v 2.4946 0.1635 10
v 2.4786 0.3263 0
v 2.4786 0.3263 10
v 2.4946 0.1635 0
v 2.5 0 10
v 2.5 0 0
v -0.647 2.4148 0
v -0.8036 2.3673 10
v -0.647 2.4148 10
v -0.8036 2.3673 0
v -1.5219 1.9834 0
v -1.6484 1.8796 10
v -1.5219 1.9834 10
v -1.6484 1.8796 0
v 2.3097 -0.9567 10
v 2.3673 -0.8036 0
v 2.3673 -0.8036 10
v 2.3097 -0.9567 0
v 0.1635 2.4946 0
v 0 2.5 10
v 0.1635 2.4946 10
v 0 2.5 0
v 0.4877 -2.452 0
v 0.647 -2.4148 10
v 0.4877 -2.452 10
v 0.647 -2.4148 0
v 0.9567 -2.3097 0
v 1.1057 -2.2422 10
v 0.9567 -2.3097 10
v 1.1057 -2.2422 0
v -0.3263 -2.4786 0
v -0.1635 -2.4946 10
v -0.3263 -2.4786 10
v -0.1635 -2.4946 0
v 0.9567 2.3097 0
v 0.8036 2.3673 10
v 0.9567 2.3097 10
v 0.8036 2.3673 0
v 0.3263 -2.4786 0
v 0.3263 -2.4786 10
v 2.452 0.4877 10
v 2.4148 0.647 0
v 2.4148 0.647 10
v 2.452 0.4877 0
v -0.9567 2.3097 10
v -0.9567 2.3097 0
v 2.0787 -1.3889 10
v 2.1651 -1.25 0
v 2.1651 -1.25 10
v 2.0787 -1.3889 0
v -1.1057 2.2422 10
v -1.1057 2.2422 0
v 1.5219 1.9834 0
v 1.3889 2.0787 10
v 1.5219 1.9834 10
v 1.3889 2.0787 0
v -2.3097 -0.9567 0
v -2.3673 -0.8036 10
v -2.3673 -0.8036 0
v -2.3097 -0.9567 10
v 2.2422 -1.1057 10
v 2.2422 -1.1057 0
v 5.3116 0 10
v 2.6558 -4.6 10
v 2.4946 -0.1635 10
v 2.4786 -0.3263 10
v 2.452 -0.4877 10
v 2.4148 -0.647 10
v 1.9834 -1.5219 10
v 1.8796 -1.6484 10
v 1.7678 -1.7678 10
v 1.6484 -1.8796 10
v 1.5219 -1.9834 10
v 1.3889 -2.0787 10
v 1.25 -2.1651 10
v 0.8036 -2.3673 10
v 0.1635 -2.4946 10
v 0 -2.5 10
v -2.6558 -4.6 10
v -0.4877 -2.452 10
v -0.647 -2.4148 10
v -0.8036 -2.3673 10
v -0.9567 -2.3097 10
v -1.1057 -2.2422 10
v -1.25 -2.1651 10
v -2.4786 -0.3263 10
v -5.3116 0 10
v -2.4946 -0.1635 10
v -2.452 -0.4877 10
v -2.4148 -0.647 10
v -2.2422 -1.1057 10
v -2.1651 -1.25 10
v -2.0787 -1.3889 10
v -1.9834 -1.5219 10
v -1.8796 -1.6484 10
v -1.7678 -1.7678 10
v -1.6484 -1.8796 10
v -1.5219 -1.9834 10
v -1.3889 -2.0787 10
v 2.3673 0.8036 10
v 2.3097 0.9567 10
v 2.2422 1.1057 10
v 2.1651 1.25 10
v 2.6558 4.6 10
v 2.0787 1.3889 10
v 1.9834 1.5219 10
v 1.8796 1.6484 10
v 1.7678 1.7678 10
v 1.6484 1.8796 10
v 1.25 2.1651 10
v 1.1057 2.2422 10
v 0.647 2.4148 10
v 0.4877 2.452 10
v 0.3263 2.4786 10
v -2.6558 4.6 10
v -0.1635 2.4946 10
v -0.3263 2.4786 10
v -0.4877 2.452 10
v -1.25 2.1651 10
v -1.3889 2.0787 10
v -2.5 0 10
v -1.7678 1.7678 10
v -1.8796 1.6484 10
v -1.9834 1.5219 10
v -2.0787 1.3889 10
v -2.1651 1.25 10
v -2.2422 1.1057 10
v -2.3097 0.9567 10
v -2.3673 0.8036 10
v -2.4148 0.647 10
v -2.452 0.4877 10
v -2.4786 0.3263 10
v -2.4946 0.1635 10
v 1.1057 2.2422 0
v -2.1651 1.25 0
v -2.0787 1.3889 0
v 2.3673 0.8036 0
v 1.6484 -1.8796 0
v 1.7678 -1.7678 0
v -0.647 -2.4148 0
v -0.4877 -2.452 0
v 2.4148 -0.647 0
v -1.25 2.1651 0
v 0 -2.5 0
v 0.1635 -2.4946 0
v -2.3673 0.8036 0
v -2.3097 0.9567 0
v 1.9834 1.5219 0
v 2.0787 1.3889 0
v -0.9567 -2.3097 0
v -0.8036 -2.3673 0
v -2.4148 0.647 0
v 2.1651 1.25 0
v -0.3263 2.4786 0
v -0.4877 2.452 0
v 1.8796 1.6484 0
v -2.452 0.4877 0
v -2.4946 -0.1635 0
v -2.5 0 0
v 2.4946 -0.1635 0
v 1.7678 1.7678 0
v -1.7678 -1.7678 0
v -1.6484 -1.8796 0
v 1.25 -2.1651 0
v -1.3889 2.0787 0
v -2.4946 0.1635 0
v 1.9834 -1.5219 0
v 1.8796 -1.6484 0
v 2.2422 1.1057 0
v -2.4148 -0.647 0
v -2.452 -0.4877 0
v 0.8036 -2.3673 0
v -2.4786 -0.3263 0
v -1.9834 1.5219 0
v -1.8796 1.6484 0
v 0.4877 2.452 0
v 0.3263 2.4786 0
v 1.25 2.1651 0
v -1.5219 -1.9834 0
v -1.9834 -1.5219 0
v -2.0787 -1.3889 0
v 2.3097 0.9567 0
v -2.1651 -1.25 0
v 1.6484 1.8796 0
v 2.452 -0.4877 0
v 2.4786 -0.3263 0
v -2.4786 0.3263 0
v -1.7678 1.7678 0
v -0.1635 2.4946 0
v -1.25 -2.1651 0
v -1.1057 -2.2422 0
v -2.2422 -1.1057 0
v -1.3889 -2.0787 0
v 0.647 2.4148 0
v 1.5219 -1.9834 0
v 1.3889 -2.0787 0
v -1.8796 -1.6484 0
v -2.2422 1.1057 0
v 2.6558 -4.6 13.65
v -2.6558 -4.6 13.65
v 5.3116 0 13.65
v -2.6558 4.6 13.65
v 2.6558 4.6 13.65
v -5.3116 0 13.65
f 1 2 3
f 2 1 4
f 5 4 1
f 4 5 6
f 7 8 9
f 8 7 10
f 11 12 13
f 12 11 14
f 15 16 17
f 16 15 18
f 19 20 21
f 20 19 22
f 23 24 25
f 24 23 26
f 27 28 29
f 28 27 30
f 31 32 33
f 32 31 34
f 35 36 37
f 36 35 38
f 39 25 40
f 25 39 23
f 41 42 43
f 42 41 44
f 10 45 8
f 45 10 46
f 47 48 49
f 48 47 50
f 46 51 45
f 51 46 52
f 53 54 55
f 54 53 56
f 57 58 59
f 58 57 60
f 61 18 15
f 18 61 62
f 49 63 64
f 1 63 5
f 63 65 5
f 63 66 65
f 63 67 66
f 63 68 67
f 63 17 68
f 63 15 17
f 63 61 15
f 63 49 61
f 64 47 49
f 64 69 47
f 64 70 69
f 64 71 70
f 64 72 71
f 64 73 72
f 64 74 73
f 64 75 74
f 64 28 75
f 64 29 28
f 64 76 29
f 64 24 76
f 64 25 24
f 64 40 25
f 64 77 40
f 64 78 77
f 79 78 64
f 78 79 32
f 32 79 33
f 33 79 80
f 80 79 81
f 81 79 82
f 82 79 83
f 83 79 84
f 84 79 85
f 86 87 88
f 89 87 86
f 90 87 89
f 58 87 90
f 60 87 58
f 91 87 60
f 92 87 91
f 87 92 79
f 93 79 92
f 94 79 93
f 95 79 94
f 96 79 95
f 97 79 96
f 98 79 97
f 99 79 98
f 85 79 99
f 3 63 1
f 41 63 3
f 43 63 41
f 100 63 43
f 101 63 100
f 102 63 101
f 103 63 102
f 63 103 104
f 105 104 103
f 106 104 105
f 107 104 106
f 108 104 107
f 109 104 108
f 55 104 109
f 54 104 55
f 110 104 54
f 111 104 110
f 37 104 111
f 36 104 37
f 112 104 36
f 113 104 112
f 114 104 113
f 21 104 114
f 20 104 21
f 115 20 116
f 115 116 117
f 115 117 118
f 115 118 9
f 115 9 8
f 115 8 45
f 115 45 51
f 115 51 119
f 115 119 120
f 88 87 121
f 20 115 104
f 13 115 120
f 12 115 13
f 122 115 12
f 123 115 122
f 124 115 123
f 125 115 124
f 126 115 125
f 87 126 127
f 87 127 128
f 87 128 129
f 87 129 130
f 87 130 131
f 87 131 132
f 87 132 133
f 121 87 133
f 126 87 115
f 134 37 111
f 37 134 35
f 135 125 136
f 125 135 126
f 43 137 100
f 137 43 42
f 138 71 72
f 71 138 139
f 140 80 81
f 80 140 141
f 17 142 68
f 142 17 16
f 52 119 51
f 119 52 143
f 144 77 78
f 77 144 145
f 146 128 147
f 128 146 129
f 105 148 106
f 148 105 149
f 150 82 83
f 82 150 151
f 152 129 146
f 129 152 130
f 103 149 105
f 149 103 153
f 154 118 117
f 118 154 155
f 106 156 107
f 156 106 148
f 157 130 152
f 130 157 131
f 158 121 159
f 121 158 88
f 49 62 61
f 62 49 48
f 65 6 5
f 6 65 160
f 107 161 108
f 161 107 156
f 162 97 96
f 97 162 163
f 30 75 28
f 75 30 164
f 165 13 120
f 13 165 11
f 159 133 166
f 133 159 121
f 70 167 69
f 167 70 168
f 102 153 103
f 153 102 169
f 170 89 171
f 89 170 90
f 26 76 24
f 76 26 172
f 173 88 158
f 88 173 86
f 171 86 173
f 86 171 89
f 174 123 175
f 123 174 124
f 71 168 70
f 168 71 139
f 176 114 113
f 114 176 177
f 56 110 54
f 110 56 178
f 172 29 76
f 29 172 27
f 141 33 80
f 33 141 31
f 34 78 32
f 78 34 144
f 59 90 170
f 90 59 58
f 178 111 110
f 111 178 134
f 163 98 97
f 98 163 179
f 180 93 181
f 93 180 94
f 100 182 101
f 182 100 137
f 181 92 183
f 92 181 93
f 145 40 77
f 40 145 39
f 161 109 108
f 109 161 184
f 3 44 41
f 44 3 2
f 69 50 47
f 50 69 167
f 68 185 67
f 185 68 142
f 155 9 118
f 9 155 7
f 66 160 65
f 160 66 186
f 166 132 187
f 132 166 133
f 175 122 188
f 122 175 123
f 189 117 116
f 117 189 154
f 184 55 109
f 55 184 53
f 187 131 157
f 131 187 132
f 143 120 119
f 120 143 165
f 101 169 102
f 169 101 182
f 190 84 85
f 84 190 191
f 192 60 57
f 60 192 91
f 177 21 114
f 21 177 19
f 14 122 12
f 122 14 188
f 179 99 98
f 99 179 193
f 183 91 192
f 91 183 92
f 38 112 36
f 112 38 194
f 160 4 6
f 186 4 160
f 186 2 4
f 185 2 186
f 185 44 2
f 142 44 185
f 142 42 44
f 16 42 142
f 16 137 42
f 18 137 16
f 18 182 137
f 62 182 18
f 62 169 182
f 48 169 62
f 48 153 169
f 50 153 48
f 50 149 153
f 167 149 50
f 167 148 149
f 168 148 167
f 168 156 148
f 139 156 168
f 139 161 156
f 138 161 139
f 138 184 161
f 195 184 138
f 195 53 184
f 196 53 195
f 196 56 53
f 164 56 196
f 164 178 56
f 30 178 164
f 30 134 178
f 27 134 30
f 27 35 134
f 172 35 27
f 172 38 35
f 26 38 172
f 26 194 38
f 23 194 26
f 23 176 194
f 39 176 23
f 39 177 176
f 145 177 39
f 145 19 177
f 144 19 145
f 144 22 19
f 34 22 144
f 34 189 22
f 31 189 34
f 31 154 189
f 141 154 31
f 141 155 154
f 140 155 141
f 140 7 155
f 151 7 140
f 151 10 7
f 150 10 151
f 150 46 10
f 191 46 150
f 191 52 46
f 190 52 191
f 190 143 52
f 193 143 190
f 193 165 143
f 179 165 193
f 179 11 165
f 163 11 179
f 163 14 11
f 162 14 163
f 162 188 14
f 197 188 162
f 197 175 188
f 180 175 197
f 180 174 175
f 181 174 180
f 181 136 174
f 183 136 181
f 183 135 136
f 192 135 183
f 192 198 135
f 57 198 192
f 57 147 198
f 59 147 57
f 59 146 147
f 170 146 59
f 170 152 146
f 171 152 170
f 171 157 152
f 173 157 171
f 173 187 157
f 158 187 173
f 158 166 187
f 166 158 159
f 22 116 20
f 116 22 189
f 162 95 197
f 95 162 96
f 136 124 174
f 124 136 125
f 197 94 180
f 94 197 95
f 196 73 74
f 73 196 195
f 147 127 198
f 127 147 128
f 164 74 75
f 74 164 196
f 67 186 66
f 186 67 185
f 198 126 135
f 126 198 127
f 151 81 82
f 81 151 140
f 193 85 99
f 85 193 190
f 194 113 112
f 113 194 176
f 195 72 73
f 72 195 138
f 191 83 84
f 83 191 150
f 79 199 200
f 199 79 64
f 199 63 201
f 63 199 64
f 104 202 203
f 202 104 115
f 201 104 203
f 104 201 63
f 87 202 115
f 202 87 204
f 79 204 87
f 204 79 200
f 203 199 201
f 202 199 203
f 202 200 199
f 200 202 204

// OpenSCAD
$fn = 96;

shaft_d = 5.0;
length = 10.0;

head_flat_to_flat = 9.2;
head_h = 3.65;

module hex_prism(flat_to_flat, h) {
    // For a regular hexagon: flat-to-flat = sqrt(3) * R (circumradius)
    R = flat_to_flat / sqrt(3);
    cylinder(h = h, r = R, $fn = 6);
}

union() {
    // Shaft
    cylinder(h = length, d = shaft_d);

    // Hex head on top
    translate([0,0,length])
        hex_prism(head_flat_to_flat, head_h);
}
